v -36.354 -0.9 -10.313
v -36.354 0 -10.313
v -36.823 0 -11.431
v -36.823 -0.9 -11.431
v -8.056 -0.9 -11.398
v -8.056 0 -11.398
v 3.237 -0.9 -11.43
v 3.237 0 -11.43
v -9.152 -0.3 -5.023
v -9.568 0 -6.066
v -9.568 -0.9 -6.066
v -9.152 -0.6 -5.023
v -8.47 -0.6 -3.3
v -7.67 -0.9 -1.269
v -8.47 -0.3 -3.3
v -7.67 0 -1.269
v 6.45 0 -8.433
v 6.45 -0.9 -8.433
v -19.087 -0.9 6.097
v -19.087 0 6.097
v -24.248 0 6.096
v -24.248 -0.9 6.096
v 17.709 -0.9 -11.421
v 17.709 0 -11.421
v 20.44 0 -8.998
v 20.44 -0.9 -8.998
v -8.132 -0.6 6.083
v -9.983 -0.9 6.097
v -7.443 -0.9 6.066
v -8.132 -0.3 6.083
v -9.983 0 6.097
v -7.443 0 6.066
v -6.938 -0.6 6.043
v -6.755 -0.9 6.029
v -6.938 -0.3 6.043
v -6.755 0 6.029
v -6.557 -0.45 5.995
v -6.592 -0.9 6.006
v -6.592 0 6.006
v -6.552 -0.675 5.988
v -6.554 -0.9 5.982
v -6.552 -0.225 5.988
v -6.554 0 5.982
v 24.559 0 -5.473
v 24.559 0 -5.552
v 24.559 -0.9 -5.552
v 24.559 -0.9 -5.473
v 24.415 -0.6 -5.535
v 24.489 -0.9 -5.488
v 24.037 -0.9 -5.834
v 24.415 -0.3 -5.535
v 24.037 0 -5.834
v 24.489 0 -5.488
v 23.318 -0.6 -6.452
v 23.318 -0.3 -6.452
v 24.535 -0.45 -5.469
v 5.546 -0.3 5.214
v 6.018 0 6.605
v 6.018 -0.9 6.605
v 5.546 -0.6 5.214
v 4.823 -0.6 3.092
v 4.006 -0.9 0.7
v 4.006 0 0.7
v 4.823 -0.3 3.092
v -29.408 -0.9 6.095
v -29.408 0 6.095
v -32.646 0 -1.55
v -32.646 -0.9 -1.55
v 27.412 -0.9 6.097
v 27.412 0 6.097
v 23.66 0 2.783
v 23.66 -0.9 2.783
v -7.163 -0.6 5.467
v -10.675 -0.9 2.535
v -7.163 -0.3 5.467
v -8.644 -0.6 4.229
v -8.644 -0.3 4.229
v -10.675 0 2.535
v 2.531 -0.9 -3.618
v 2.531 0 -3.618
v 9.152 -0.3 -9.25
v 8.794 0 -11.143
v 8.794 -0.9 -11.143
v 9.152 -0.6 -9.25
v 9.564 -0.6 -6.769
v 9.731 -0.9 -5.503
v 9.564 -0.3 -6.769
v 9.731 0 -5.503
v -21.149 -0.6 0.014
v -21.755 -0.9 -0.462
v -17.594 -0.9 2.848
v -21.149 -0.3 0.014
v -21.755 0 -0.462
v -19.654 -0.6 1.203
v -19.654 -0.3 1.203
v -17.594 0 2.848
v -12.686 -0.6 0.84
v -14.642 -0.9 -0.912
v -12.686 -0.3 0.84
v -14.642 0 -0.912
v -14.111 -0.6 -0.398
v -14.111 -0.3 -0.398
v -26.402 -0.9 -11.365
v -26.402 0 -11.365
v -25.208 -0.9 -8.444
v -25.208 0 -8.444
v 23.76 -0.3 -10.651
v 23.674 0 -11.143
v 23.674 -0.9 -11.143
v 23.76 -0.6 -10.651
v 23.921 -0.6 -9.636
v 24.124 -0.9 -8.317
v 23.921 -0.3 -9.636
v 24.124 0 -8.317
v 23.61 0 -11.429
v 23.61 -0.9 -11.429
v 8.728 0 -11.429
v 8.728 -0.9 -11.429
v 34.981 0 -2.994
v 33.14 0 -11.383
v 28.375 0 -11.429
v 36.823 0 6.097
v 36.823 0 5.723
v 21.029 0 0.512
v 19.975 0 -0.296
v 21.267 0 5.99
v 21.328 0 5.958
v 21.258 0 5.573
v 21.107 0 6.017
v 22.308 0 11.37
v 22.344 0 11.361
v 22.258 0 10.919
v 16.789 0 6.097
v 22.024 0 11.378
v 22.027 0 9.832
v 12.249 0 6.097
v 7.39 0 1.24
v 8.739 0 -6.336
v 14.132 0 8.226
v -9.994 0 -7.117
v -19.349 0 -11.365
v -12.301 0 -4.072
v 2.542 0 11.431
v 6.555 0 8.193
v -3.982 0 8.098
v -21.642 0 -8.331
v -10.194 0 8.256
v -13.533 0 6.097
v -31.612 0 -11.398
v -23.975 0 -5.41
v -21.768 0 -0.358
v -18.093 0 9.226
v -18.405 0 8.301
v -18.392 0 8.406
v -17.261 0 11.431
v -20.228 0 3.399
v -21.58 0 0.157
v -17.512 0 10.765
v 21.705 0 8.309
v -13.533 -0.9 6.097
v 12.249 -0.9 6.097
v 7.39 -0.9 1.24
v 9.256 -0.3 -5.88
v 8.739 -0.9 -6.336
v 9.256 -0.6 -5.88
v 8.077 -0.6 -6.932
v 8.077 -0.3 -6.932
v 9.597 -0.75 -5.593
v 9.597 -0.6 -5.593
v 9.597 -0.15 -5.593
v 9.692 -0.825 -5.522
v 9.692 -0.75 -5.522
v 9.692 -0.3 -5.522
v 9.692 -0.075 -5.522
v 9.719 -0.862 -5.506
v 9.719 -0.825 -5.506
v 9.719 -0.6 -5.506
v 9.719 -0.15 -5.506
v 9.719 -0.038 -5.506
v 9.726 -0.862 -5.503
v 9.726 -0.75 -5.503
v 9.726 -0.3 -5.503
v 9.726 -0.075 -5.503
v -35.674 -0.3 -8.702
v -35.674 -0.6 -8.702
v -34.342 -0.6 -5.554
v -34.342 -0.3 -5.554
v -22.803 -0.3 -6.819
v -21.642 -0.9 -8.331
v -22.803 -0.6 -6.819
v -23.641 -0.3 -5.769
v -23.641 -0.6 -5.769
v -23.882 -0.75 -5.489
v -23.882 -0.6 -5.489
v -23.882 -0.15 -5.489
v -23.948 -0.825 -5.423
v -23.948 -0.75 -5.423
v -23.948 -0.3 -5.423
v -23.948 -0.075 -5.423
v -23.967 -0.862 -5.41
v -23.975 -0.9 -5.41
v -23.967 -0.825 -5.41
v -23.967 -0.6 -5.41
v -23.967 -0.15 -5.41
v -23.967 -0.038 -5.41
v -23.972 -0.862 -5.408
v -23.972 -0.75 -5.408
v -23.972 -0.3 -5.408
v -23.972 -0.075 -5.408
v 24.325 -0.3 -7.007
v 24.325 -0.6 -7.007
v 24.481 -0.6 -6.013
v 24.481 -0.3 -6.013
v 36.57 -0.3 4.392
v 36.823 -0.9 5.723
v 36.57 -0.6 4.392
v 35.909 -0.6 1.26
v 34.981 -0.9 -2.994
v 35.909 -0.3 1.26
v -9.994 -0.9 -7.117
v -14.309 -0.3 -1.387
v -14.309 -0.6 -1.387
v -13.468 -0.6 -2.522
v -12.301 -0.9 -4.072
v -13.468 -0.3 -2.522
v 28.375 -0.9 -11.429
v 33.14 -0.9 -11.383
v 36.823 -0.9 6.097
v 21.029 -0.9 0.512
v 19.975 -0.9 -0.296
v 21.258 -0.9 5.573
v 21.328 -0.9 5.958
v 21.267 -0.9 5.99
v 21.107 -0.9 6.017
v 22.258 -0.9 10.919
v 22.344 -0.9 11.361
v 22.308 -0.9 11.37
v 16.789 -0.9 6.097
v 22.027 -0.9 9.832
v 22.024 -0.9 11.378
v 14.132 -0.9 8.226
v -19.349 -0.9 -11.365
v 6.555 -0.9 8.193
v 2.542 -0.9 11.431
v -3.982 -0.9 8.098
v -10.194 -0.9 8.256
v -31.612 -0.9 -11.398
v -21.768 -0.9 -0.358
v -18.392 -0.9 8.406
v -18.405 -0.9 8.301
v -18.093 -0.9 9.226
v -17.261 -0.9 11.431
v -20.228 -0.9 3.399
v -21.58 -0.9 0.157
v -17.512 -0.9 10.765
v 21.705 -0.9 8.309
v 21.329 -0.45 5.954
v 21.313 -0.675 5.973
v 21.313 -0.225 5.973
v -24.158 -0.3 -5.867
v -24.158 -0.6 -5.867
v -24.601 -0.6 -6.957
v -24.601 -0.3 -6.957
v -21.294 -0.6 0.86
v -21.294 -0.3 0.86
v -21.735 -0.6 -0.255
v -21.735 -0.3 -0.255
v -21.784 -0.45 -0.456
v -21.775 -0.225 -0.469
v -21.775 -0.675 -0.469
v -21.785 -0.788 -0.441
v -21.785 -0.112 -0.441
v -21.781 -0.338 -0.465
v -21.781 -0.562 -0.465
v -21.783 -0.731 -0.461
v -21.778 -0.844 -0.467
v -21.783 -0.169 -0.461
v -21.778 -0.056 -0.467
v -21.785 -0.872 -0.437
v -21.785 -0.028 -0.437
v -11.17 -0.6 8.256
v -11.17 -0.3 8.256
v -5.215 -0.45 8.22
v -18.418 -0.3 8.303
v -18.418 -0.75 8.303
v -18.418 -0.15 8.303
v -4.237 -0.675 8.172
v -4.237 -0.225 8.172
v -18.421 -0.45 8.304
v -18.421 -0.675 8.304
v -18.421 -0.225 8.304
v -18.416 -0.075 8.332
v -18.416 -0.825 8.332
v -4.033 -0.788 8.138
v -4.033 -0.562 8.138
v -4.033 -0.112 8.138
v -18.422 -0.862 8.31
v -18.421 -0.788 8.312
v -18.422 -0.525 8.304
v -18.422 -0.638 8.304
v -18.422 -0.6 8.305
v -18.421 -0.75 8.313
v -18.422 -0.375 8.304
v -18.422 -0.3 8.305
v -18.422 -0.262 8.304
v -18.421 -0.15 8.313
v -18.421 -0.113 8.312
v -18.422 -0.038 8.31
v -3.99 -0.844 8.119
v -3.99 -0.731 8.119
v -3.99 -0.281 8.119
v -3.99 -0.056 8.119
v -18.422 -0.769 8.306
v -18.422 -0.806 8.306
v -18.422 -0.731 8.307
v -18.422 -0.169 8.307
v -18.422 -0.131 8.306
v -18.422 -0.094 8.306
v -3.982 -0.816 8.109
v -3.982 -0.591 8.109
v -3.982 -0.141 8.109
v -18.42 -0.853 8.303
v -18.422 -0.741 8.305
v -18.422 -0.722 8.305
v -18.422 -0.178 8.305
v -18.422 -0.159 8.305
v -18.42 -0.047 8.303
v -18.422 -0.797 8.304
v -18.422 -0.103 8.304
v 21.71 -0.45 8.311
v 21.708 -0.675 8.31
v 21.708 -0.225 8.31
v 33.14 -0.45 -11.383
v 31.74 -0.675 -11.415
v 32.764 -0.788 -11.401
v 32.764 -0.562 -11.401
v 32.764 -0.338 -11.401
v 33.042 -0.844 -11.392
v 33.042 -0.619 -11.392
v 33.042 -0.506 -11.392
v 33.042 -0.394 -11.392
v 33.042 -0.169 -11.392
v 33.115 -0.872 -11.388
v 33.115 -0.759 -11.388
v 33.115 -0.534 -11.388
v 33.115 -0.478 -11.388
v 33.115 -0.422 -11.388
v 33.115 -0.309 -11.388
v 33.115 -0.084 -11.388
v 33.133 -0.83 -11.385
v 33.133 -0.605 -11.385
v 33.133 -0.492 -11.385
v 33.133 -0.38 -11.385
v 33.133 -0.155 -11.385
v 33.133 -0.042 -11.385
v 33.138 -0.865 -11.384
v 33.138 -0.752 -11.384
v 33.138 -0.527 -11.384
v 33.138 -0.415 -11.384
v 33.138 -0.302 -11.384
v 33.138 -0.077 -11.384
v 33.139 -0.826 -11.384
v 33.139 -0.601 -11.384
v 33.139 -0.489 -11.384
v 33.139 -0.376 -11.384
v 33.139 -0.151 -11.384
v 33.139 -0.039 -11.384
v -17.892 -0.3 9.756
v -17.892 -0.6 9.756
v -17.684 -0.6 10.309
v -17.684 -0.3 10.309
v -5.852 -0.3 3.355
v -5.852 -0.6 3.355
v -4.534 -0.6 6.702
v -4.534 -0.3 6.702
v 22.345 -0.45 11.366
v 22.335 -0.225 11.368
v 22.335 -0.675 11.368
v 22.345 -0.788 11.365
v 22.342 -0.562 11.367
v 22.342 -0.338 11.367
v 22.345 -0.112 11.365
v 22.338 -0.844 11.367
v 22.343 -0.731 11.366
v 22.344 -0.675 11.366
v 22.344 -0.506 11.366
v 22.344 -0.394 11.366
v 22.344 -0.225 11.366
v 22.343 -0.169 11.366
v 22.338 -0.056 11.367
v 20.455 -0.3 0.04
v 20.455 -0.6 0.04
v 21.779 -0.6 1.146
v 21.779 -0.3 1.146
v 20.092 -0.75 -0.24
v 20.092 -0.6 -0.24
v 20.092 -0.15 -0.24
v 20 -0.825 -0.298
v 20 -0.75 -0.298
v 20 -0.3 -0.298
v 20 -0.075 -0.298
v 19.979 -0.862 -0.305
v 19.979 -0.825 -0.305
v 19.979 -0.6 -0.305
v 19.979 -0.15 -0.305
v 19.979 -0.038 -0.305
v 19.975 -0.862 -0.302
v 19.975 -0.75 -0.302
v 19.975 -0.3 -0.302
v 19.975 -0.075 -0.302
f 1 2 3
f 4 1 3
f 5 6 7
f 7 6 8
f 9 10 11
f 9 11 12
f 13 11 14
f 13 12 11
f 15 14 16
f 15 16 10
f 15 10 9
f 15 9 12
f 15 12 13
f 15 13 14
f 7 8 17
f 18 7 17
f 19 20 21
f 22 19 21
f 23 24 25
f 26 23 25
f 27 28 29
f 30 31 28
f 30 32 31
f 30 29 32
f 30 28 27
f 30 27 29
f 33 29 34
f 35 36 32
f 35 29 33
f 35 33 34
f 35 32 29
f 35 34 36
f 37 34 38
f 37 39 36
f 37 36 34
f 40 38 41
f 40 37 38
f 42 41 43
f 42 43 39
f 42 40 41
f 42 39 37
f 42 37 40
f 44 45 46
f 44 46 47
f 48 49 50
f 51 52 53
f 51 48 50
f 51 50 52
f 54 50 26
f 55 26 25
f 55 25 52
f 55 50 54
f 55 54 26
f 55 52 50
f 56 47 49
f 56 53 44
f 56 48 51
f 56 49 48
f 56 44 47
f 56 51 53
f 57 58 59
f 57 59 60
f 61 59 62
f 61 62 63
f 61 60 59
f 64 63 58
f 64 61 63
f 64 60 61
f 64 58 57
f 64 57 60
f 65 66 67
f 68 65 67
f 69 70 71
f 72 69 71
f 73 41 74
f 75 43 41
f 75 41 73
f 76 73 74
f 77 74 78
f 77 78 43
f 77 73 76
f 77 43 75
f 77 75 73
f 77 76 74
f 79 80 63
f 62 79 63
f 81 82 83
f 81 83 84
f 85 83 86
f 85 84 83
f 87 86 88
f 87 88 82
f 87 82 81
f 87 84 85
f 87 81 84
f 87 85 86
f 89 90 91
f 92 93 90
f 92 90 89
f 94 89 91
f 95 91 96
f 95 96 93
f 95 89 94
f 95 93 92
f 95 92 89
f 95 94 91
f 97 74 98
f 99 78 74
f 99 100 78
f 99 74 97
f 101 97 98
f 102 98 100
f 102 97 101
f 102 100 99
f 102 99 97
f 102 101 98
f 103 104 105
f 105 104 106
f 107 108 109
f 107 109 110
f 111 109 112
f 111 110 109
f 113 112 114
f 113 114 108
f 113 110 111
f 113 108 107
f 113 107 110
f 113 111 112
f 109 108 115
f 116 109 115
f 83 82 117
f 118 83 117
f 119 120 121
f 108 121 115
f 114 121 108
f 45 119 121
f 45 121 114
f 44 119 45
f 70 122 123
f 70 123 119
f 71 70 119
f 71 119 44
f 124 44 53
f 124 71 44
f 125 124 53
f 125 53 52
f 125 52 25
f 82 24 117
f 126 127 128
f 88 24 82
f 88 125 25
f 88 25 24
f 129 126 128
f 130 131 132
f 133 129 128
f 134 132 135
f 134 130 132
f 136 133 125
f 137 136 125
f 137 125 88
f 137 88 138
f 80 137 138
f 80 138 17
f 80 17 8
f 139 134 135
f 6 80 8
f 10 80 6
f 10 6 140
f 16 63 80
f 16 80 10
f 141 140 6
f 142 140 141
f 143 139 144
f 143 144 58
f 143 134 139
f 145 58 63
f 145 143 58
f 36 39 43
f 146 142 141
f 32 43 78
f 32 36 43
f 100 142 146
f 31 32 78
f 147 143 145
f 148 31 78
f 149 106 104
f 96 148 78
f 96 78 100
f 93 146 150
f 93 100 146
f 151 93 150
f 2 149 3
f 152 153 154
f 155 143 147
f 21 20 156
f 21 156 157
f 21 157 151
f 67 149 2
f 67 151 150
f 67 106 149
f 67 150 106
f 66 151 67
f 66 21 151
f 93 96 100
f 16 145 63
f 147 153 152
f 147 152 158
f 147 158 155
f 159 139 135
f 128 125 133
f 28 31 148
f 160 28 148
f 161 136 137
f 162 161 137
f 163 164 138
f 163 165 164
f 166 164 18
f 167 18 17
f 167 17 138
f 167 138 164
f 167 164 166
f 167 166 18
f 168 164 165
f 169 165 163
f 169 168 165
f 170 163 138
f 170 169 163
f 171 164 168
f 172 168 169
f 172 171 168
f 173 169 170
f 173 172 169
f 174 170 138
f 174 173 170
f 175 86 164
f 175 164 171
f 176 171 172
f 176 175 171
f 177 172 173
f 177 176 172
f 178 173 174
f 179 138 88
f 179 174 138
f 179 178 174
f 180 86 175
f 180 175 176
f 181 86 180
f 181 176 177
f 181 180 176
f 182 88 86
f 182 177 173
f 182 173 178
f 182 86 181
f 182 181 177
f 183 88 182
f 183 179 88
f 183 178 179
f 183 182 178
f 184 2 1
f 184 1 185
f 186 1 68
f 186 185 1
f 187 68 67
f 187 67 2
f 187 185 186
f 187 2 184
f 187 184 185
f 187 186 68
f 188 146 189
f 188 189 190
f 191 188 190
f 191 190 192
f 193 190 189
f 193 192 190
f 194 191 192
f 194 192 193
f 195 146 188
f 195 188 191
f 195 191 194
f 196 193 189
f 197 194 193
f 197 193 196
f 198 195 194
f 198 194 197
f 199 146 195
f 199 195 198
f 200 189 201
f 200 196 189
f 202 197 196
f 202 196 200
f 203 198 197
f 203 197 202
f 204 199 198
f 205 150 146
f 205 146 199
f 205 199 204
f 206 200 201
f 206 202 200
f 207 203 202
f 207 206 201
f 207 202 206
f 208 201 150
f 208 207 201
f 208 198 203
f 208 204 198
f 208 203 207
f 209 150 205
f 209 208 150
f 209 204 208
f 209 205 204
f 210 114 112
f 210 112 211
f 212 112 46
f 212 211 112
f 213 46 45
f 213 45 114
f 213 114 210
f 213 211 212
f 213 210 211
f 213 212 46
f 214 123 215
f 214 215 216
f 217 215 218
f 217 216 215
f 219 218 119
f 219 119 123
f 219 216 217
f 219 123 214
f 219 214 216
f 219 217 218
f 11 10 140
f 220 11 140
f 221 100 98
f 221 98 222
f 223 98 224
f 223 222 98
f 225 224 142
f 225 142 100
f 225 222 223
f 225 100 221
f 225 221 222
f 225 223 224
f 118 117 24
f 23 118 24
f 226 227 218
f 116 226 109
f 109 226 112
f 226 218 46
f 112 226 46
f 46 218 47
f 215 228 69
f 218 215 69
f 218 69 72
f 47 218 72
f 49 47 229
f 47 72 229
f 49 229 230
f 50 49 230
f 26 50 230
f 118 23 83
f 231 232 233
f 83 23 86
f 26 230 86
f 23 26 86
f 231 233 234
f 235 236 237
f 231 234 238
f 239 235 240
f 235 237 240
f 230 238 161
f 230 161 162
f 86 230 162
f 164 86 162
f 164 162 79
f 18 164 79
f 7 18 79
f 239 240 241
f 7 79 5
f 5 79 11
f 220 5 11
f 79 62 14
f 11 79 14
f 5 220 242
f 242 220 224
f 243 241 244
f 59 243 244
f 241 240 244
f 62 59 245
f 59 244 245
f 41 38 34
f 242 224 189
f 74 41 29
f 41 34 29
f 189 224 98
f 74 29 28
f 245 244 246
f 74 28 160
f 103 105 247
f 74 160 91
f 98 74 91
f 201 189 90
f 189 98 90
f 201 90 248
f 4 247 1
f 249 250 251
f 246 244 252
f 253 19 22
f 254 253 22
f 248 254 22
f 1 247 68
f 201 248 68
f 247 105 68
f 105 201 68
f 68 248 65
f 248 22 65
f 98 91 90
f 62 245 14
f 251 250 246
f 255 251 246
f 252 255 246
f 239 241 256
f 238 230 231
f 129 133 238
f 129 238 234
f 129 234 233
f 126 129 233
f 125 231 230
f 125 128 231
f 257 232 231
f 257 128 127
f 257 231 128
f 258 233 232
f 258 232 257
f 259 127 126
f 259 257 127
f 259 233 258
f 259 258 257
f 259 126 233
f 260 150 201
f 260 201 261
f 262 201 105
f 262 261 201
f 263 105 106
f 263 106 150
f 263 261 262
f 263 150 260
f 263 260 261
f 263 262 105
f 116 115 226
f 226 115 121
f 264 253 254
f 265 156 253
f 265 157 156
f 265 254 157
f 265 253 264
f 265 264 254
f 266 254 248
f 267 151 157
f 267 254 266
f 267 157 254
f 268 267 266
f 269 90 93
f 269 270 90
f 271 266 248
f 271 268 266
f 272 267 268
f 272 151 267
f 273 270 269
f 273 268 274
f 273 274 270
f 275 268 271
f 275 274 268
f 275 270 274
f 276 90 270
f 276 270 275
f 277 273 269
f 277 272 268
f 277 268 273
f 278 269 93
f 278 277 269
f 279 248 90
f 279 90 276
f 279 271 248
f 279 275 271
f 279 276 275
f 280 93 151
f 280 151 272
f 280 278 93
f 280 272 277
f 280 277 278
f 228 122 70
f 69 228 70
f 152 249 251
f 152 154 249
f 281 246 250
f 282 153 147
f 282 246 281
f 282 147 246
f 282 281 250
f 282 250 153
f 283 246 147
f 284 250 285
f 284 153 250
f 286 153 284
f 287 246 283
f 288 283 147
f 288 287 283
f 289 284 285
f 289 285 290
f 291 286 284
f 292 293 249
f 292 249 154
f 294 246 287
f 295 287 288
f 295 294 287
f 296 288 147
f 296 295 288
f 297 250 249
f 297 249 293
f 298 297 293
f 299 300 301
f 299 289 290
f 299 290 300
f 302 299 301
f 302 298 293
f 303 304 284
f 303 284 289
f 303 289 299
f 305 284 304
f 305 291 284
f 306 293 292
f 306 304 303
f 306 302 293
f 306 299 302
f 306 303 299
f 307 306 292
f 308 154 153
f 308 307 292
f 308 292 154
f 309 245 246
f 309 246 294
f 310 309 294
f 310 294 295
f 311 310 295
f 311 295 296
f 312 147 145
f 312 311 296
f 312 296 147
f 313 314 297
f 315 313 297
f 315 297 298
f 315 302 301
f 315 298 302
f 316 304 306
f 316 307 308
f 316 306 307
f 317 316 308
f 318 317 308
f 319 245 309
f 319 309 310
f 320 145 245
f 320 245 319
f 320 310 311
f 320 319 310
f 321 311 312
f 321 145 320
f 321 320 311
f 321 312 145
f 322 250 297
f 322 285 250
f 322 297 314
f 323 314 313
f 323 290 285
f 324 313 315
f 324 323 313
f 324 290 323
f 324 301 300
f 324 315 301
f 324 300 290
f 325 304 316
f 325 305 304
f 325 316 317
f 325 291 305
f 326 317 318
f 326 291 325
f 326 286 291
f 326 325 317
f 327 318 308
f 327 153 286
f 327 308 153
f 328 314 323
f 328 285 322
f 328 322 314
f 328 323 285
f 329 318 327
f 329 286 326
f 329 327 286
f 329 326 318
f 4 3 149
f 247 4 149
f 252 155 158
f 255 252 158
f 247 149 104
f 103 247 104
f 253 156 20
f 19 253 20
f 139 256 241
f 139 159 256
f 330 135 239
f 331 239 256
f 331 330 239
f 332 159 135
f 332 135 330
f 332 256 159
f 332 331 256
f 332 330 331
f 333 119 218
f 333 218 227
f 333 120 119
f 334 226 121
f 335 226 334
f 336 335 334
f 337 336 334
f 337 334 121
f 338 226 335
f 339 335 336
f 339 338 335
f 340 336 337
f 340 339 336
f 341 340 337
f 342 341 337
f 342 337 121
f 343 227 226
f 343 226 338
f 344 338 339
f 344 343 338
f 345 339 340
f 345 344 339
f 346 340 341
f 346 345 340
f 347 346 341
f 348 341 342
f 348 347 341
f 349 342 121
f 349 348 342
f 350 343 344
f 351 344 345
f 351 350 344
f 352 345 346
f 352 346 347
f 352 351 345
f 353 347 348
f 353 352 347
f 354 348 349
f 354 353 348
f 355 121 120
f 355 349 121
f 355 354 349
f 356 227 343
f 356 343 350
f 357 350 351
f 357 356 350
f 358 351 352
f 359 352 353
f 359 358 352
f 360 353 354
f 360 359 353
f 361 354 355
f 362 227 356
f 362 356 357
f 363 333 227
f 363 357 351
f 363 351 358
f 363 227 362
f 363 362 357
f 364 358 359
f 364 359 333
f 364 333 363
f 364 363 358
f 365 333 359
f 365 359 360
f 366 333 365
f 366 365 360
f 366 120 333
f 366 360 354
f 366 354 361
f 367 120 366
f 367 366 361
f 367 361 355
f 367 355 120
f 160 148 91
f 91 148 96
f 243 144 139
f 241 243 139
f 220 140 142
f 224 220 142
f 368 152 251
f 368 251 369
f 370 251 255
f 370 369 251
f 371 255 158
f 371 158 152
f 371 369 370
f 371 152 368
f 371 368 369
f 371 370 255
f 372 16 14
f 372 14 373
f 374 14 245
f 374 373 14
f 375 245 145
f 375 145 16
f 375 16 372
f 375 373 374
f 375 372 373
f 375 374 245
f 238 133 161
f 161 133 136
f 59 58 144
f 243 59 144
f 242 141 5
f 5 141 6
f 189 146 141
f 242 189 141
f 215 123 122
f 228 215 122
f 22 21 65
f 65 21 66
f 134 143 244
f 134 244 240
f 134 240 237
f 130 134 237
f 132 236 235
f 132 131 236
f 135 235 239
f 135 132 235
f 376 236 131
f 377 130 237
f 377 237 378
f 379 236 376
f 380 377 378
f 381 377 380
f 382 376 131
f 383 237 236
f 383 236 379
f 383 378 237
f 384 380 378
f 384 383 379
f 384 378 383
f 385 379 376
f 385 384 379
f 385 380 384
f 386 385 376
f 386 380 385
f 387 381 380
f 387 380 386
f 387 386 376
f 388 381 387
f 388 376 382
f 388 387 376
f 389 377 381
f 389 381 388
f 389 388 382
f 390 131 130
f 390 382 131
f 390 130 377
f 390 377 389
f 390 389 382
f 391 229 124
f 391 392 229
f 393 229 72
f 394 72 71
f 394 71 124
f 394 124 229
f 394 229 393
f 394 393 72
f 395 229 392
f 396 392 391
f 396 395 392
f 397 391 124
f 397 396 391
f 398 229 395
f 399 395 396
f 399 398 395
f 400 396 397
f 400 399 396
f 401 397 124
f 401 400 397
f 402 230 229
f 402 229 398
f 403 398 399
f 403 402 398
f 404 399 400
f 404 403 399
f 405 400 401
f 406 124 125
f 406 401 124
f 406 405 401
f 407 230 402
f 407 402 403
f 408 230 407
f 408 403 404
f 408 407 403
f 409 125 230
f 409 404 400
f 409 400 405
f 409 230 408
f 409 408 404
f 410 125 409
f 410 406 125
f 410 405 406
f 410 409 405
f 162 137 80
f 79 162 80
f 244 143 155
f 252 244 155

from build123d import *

# Parameters (mm, degrees)
F1_DEPTH = 2
F2_SCALE = 0.45


with BuildPart() as f1:
    # F0 (on Front) → F1 (new body)
    with BuildSketch(Plane.XZ):
        with BuildLine():
            add(Edge.make_bspline(
                [(-80.786111, -22.917398), (-80.213136, -21.550251), (-76.505838, -12.787243), (-72.547671, -3.444042)],
                knots=[0, 0, 0, 0, 1, 1, 1, 1], degree=3))
            Line((-80.786111, -22.917398), (-81.827884, -25.403118))
            Line((-81.827884, -25.403118), (-70.249846, -25.329444))
            Line((-70.249846, -25.329444), (-58.671809, -25.255772))
            Line((-58.671809, -25.255772), (-56.018156, -18.764661))
            add(Edge.make_bspline(
                [(-53.277055, -12.02312), (-53.325152, -12.160856), (-54.558646, -15.19455), (-56.018156, -18.764661)],
                knots=[0, 0, 0, 0, 1, 1, 1, 1], degree=3))
            add(Edge.make_bspline(
                [(-48.094211, -18.514231), (-50.896677, -14.806382), (-53.228959, -11.885382), (-53.277055, -12.02312)],
                knots=[0, 0, 0, 0, 1, 1, 1, 1], degree=3))
            Line((-48.094211, -18.514231), (-42.998818, -25.255772))
            Line((-42.998818, -25.255772), (-17.90271, -25.327832))
            Line((-17.90271, -25.327832), (7.193396, -25.399895))
            Line((7.193396, -25.399895), (14.332707, -18.738979))
            add(Edge.make_bspline(
                [(21.623729, -12.229769), (21.540287, -12.14633), (18.25933, -15.075475), (14.332707, -18.738979)],
                knots=[0, 0, 0, 0, 1, 1, 1, 1], degree=3))
            add(Edge.make_bspline(
                [(19.542574, -24.761889), (20.056092, -22.543512), (21.748181, -12.354223), (21.623729, -12.229769)],
                knots=[0, 0, 0, 0, 1, 1, 1, 1], degree=3))
            Line((19.542574, -24.761889), (19.395582, -25.396889))
            Line((19.395582, -25.396889), (29.374511, -25.388394))
            Line((29.374511, -25.388394), (39.35344, -25.379899))
            Line((39.35344, -25.379899), (45.421218, -19.995099))
            add(Edge.make_bspline(
                [(54.574446, -12.337595), (54.698525, -11.776545), (54.412979, -12.015432), (45.421218, -19.995099)],
                knots=[0, 0, 0, 0, 1, 1, 1, 1], degree=3))
            add(Edge.make_bspline(
                [(53.608552, -18.482439), (54.078929, -15.377995), (54.513579, -12.612815), (54.574446, -12.337595)],
                knots=[0, 0, 0, 0, 1, 1, 1, 1], degree=3))
            add(Edge.make_bspline(
                [(52.609674, -24.761883), (52.688683, -24.412633), (53.138178, -21.586883), (53.608552, -18.482439)],
                knots=[0, 0, 0, 0, 1, 1, 1, 1], degree=3))
            Line((52.609674, -24.761883), (52.466021, -25.396883))
            Line((52.466021, -25.396883), (63.05473, -25.396883))
            add(Edge.make_bspline(
                [(73.64344, -25.29565), (73.64344, -25.351327), (68.878521, -25.396883), (63.05473, -25.396883)],
                knots=[0, 0, 0, 0, 1, 1, 1, 1], degree=3))
            add(Edge.make_bspline(
                [(77.735662, -6.653343), (75.48494, -16.850935), (73.64344, -25.239971), (73.64344, -25.29565)],
                knots=[0, 0, 0, 0, 1, 1, 1, 1], degree=3))
            add(Edge.make_bspline(
                [(81.827884, 12.718757), (81.827884, 12.26169), (79.986384, 3.544246), (77.735662, -6.653343)],
                knots=[0, 0, 0, 0, 1, 1, 1, 1], degree=3))
            Line((81.827884, 12.718757), (81.827884, 13.549783))
            Line((81.827884, 13.549783), (71.37213, 13.549783))
            Line((71.37213, 13.549783), (60.916375, 13.549783))
            Line((60.916375, 13.549783), (52.576844, 6.185254))
            add(Edge.make_bspline(
                [(44.389024, -0.658635), (44.305582, -0.944989), (47.9901, 2.134761), (52.576844, 6.185254)],
                knots=[0, 0, 0, 0, 1, 1, 1, 1], degree=3))
            add(Edge.make_bspline(
                [(47.396773, 13.230562), (47.396773, 12.904358), (44.664046, 0.285161), (44.389024, -0.658635)],
                knots=[0, 0, 0, 0, 1, 1, 1, 1], degree=3))
            add(Edge.make_bspline(
                [(37.308686, 13.549783), (44.625438, 13.549783), (47.396773, 13.462088), (47.396773, 13.230562)],
                knots=[0, 0, 0, 0, 1, 1, 1, 1], degree=3))
            Line((37.308686, 13.549783), (27.220599, 13.549783))
            Line((27.220599, 13.549783), (16.42199, 2.754783))
            Line((16.42199, 2.754783), (5.623383, -8.040217))
            Line((5.623383, -8.040217), (8.902071, 1.555339))
            add(Edge.make_bspline(
                [(13.374196, 14.678672), (12.717806, 12.738394), (10.70535, 6.832894), (8.902071, 1.555339)],
                knots=[0, 0, 0, 0, 1, 1, 1, 1], degree=3))
            Line((13.374196, 14.678672), (14.567629, 18.20645))
            Line((14.567629, 18.20645), (31.405534, 18.279226))
            add(Edge.make_bspline(
                [(48.24344, 18.468314), (48.24344, 18.404342), (40.666383, 18.319253), (31.405534, 18.279226)],
                knots=[0, 0, 0, 0, 1, 1, 1, 1], degree=3))
            add(Edge.make_bspline(
                [(48.948995, 21.847967), (48.56094, 20.05313), (48.24344, 18.532286), (48.24344, 18.468314)],
                knots=[0, 0, 0, 0, 1, 1, 1, 1], degree=3))
            add(Edge.make_bspline(
                [(49.654551, 25.257212), (49.654551, 25.176965), (49.337051, 23.642805), (48.948995, 21.847967)],
                knots=[0, 0, 0, 0, 1, 1, 1, 1], degree=3))
            add(Edge.make_bspline(
                [(5.648162, 25.403117), (29.851675, 25.403117), (49.654551, 25.33746), (49.654551, 25.257212)],
                knots=[0, 0, 0, 0, 1, 1, 1, 1], degree=3))
            Line((5.648162, 25.403117), (-38.358227, 25.403117))
            Line((-38.358227, 25.403117), (-38.915701, 23.92145))
            add(Edge.make_bspline(
                [(-40.205978, 20.501182), (-39.802937, 21.567413), (-39.222312, 23.106533), (-38.915701, 23.92145)],
                knots=[0, 0, 0, 0, 1, 1, 1, 1], degree=3))
            add(Edge.make_bspline(
                [(-40.938782, 18.455071), (-40.938782, 18.514201), (-40.60902, 19.434951), (-40.205978, 20.501182)],
                knots=[0, 0, 0, 0, 1, 1, 1, 1], degree=3))
            add(Edge.make_bspline(
                [(-24.821921, 18.347561), (-33.686196, 18.347561), (-40.938782, 18.39594), (-40.938782, 18.455071)],
                knots=[0, 0, 0, 0, 1, 1, 1, 1], degree=3))
            add(Edge.make_bspline(
                [(-8.849907, 17.994783), (-8.735025, 18.274578), (-12.039328, 18.347561), (-24.821921, 18.347561)],
                knots=[0, 0, 0, 0, 1, 1, 1, 1], degree=3))
            add(Edge.make_bspline(
                [(-17.044525, -2.819106), (-12.645437, 8.372812), (-9.026821, 17.563906), (-8.849907, 17.994783)],
                knots=[0, 0, 0, 0, 1, 1, 1, 1], degree=3))
            add(Edge.make_bspline(
                [(-21.262571, -13.480479), (-20.742486, -12.195775), (-18.844367, -7.398161), (-17.044525, -2.819106)],
                knots=[0, 0, 0, 0, 1, 1, 1, 1], degree=3))
            Line((-21.262571, -13.480479), (-22.208179, -15.816291))
            Line((-22.208179, -15.816291), (-27.335863, -9.048331))
            add(Edge.make_bspline(
                [(-32.538387, -2.026468), (-32.497225, -2.166114), (-30.15609, -5.325953), (-27.335863, -9.048331)],
                knots=[0, 0, 0, 0, 1, 1, 1, 1], degree=3))
            add(Edge.make_bspline(
                [(-23.723227, 5.632445), (-28.612727, 1.559688), (-32.579549, -1.886821), (-32.538387, -2.026468)],
                knots=[0, 0, 0, 0, 1, 1, 1, 1], degree=3))
            add(Edge.make_bspline(
                [(-14.565116, 13.293616), (-14.712577, 13.152728), (-18.833727, 9.7052), (-23.723227, 5.632445)],
                knots=[0, 0, 0, 0, 1, 1, 1, 1], degree=3))
            add(Edge.make_bspline(
                [(-22.185116, 13.549484), (-17.45265, 13.549659), (-14.404263, 13.447297), (-14.565116, 13.293616)],
                knots=[0, 0, 0, 0, 1, 1, 1, 1], degree=3))
            Line((-22.185116, 13.549484), (-30.073227, 13.549202))
            Line((-30.073227, 13.549202), (-39.098868, 6.329277))
            add(Edge.make_bspline(
                [(-48.34488, -1.026868), (-48.223677, -0.951957), (-44.062971, 2.358306), (-39.098868, 6.329277)],
                knots=[0, 0, 0, 0, 1, 1, 1, 1], degree=3))
            add(Edge.make_bspline(
                [(-44.95047, 7.552581), (-48.164072, -0.051688), (-48.616254, -1.194584), (-48.34488, -1.026868)],
                knots=[0, 0, 0, 0, 1, 1, 1, 1], degree=3))
            Line((-44.95047, 7.552581), (-42.416012, 13.549803))
            Line((-42.416012, 13.549803), (-53.883509, 13.546699))
            Line((-53.883509, 13.546699), (-65.351005, 13.543594))
            Line((-65.351005, 13.543594), (-72.547671, -3.444042))
        make_face()
    extrude(amount=F1_DEPTH)


with BuildPart() as f1_1:
    # F2: moved
    add(f1.part.scale(F2_SCALE))


solid = f1_1.part
